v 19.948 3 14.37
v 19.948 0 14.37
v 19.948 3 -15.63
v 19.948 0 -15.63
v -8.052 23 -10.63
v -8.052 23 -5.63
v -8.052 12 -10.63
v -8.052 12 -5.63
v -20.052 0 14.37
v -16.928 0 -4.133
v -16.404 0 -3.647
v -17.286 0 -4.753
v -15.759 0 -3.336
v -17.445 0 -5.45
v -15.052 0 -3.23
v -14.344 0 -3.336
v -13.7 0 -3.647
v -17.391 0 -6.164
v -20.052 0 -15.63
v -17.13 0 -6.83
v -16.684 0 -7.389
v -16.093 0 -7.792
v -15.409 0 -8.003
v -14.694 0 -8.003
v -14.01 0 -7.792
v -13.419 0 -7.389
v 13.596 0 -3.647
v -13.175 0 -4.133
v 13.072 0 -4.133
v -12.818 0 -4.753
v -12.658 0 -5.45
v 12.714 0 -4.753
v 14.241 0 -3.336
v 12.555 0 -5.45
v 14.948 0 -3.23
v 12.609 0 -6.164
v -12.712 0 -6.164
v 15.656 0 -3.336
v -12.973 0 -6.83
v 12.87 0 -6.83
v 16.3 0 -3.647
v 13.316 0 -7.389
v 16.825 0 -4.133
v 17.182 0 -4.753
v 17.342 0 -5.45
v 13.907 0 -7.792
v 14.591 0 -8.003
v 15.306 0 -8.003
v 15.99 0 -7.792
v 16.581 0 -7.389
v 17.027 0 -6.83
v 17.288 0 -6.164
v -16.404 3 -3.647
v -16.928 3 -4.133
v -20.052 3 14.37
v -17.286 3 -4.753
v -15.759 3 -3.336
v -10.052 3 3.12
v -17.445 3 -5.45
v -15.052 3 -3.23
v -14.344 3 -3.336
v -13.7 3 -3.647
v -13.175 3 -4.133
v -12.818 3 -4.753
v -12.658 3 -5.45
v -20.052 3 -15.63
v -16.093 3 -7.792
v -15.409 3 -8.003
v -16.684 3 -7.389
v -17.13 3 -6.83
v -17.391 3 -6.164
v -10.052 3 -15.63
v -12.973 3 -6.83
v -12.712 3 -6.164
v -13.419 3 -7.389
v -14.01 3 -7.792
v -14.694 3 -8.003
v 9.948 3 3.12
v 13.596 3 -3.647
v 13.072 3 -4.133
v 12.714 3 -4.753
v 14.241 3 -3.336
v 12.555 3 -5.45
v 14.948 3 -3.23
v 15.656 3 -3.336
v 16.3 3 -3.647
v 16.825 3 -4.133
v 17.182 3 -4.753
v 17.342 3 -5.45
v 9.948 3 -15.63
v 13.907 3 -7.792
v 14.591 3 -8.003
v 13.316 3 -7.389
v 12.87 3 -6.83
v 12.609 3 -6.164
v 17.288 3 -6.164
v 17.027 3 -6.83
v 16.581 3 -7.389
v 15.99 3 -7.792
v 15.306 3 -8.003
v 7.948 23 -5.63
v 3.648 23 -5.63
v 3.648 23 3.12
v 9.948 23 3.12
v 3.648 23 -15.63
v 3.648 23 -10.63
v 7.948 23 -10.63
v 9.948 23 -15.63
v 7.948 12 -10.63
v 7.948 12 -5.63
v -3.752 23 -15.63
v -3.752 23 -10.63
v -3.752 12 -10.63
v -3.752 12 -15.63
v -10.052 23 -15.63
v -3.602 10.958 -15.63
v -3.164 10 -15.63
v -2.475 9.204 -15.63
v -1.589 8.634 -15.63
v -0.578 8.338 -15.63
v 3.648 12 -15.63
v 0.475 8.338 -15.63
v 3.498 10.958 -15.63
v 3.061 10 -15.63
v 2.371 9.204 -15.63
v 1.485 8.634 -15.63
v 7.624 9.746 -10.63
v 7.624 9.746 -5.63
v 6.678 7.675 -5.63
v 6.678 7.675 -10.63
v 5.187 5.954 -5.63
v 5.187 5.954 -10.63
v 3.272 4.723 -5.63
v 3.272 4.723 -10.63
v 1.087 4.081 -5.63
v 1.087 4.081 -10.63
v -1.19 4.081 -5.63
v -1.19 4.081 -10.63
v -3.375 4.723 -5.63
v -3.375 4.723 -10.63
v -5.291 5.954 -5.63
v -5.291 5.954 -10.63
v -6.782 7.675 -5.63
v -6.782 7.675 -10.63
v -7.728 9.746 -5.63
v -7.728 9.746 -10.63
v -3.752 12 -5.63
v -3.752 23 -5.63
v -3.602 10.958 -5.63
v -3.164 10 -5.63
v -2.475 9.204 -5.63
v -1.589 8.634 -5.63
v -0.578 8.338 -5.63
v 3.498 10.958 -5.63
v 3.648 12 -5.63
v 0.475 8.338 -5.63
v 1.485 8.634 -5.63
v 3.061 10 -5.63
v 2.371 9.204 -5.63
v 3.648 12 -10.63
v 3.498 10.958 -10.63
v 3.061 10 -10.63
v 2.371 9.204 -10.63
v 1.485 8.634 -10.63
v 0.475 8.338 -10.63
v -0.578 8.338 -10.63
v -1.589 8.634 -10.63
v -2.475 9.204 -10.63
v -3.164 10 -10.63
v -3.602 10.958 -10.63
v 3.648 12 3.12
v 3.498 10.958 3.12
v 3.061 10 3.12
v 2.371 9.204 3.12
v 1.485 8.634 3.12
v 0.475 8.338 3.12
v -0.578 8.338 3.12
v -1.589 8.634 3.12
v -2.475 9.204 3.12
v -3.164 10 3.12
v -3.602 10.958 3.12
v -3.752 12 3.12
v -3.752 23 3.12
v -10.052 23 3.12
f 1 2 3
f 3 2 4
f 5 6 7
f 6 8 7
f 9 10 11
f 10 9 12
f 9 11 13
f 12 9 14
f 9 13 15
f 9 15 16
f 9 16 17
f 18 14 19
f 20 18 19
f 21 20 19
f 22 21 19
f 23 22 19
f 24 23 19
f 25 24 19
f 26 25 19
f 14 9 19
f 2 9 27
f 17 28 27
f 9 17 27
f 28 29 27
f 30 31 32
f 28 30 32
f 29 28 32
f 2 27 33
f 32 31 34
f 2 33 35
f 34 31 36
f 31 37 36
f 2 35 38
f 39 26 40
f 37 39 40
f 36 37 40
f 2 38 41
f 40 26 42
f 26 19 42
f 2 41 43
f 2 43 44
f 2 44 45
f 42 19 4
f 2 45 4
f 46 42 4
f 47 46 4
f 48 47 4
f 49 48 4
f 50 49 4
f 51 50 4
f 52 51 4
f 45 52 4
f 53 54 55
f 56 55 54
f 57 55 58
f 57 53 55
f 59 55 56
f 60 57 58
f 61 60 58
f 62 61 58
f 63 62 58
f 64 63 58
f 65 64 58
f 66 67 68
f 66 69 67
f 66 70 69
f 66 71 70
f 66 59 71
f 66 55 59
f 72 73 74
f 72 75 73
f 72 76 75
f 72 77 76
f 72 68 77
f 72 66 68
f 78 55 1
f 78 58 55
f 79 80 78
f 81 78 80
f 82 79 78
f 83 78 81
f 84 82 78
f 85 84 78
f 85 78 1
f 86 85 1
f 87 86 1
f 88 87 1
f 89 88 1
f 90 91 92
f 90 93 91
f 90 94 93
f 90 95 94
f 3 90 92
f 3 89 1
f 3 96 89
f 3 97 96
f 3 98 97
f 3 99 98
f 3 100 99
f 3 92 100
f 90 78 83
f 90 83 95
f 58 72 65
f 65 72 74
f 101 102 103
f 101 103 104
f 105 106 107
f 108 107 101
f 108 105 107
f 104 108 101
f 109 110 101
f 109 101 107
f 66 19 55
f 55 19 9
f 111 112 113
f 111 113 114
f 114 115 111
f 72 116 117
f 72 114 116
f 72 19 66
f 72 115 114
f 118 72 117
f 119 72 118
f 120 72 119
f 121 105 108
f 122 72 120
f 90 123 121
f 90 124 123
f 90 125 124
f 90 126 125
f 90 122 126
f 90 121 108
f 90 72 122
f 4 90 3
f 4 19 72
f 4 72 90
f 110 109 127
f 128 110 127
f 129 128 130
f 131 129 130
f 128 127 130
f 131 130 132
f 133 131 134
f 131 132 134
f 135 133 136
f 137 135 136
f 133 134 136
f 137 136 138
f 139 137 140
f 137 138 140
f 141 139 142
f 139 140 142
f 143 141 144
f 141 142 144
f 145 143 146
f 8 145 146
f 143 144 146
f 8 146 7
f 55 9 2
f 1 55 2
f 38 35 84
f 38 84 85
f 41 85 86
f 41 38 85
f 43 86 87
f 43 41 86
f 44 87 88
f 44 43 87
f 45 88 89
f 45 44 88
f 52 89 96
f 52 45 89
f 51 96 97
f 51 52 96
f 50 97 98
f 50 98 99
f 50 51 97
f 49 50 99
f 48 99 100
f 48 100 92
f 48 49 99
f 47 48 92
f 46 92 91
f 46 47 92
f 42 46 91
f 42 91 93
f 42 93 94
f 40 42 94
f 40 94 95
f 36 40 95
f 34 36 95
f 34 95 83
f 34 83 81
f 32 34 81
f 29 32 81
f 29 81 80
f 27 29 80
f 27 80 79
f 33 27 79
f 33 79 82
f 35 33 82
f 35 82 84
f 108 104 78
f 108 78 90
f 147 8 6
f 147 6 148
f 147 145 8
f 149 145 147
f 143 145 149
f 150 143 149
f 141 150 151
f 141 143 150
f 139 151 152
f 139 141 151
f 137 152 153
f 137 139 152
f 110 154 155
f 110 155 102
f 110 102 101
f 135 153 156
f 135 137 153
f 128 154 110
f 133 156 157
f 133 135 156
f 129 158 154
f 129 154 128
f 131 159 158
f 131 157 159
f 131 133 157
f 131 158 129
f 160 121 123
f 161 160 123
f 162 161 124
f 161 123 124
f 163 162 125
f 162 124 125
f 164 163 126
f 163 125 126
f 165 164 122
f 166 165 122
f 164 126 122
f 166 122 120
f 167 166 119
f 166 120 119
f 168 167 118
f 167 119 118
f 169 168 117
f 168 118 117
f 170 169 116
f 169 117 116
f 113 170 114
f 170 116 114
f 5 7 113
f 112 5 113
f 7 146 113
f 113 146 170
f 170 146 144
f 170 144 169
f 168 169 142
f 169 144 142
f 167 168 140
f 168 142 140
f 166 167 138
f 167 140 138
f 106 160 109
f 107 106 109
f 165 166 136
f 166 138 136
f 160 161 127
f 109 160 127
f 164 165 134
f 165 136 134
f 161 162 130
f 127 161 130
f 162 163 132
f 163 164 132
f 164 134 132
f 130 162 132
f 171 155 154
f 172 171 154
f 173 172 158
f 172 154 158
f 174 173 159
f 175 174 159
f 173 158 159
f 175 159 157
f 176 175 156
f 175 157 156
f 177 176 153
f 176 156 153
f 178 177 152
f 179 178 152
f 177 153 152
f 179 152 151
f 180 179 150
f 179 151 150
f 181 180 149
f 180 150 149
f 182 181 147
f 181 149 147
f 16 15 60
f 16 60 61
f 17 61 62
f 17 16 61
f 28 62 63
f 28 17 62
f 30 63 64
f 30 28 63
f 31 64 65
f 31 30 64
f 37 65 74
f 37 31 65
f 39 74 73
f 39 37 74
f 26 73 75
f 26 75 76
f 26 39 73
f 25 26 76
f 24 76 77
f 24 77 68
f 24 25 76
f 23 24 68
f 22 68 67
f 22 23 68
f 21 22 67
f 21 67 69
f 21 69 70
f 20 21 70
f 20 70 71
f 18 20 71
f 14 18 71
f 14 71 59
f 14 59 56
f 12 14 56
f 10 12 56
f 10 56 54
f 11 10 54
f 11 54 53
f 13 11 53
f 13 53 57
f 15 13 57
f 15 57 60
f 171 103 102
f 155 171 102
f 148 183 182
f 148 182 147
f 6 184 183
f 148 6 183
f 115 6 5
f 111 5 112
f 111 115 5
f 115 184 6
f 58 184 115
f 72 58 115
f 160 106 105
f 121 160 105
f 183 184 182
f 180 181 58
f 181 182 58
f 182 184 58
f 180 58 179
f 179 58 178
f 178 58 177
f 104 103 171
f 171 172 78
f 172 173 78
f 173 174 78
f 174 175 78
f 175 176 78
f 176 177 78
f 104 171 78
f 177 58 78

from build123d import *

# Parameters (mm, degrees)
ESQUISSE3_W                  = 10
ESQUISSE3_H                  = 15
ESQUISSE3_H_2                = 10
ESQUISSE3_H_3                = 5
BOSS_EXTRU_1_DEPTH           = 3
ESQUISSE4_W                  = 10
ESQUISSE4_H                  = 5
ESQUISSE4_H_2                = 3.75
BOSS_EXTRU_2_DEPTH           = 17
ENL_V_MAT_EXTRU_1_DEPTH      = 5
ENL_V_MAT_EXTRU_2_DEPTH      = 18.75
ESQUISSE8_W                  = 20
ESQUISSE8_H                  = 18.75
ESQUISSE8_W_2                = 16
ESQUISSE8_H_2                = 5
BOSS_EXTRU_3_DEPTH           = 3
ESQUISSE9_R                  = 3.7
ESQUISSE9_R_2                = 3
ENL_V_MAT_EXTRU_3_DEPTH      = 43.790987898
ENL_V_START                  = -6
ESQUISSE10_R                 = 2.4
ESQUISSE10_R_2               = 2
ENL_V_MAT_EXTRU_4_DEPTH      = 6
ENL_V_MAT_EXTRU_5_REACH      = 36.283
ENL_V_MAT_EXTRU_5_END_RADIUS = 3.7
ESQUISSE12_W                 = 3.7
ESQUISSE12_H                 = 5
ESQUISSE12_W_2               = 7.4
ESQUISSE12_H_2               = 8.75


with BuildPart() as part:
    # Esquisse3 → Boss.-Extru.1 (new body)
    with BuildSketch(Plane(origin=(0, 0, 0), x_dir=(1, 0, 0), z_dir=(0, 1, 0))):
        with Locations((-15.05164944, -6.870348765)):
            Rectangle(ESQUISSE3_W, ESQUISSE3_H)
        with Locations((14.94835056, -6.870348765)):
            Rectangle(ESQUISSE3_W, ESQUISSE3_H)
        with BuildLine():
            Line((-10.05164944, 5.629651235), (-10.05164944, 15.629651235))
            Line((-10.05164944, 15.629651235), (-20.05164944, 15.629651235))
            Line((-20.05164944, 15.629651235), (-20.05164944, 5.629651235))
            Line((-20.05164944, 5.629651235), (-17.05164944, 5.629651235))
            ThreePointArc((-17.05164944, 5.629651235), (-15.05164944, 7.629651235), (-13.05164944, 5.629651235))
            Line((-13.05164944, 5.629651235), (-10.05164944, 5.629651235))
        make_face()
        with BuildLine():
            Line((-10.05164944, 0.629651235), (-10.05164944, 5.629651235))
            Line((-10.05164944, 5.629651235), (-13.05164944, 5.629651235))
            ThreePointArc((-13.05164944, 5.629651235), (-15.05164944, 3.629651235), (-17.05164944, 5.629651235))
            Line((-17.05164944, 5.629651235), (-20.05164944, 5.629651235))
            Line((-20.05164944, 5.629651235), (-20.05164944, 0.629651235))
            Line((-20.05164944, 0.629651235), (-10.05164944, 0.629651235))
        make_face()
        with Locations((-5.05164944, 10.629651235)):
            Rectangle(ESQUISSE3_W, ESQUISSE3_H_2)
        with Locations((4.94835056, 10.629651235)):
            Rectangle(ESQUISSE3_W, ESQUISSE3_H_2)
        with BuildLine():
            Line((19.94835056, 15.629651235), (9.94835056, 15.629651235))
            Line((9.94835056, 15.629651235), (9.94835056, 5.629651235))
            Line((9.94835056, 5.629651235), (12.94835056, 5.629651235))
            ThreePointArc((12.94835056, 5.629651235), (14.94835056, 7.629651235), (16.94835056, 5.629651235))
            Line((16.94835056, 5.629651235), (19.94835056, 5.629651235))
            Line((19.94835056, 5.629651235), (19.94835056, 15.629651235))
        make_face()
        with BuildLine():
            Line((12.94835056, 5.629651235), (9.94835056, 5.629651235))
            Line((9.94835056, 5.629651235), (9.94835056, 0.629651235))
            Line((9.94835056, 0.629651235), (19.94835056, 0.629651235))
            Line((19.94835056, 0.629651235), (19.94835056, 5.629651235))
            Line((19.94835056, 5.629651235), (16.94835056, 5.629651235))
            ThreePointArc((16.94835056, 5.629651235), (14.94835056, 3.629651235), (12.94835056, 5.629651235))
        make_face()
        with Locations((4.94835056, -6.870348765)):
            Rectangle(ESQUISSE3_W, ESQUISSE3_H)
        with Locations((-5.05164944, -6.870348765)):
            Rectangle(ESQUISSE3_W, ESQUISSE3_H)
        with Locations((4.94835056, 3.129651235)):
            Rectangle(ESQUISSE3_W, ESQUISSE3_H_3)
        with Locations((-5.05164944, 3.129651235)):
            Rectangle(ESQUISSE3_W, ESQUISSE3_H_3)
    extrude(amount=BOSS_EXTRU_1_DEPTH)

    # Esquisse4 → Boss.-Extru.2 (add)
    with BuildSketch(Plane(origin=(0, 3, 0), x_dir=(1, 0, 0), z_dir=(0, 1, 0))):
        with Locations((-5.05164944, 3.129651235)):
            Rectangle(ESQUISSE4_W, ESQUISSE4_H)
        with Locations((-5.05164944, -1.245348765)):
            Rectangle(ESQUISSE4_W, ESQUISSE4_H_2)
        with Locations((4.94835056, -1.245348765)):
            Rectangle(ESQUISSE4_W, ESQUISSE4_H_2)
        with Locations((4.94835056, 3.129651235)):
            Rectangle(ESQUISSE4_W, ESQUISSE4_H)
        Polygon((-0.05164944, 15.629651235), (-0.05164944, 5.629651235), (9.94835056, 5.629651235), (9.94835056, 8.129651235), align=None)
        Polygon((-10.05164944, 8.129651235), (-10.05164944, 5.629651235), (-0.05164944, 5.629651235), (-0.05164944, 15.629651235), align=None)
        Polygon((-10.05164944, 15.629651235), (-10.05164944, 8.129651235), (-0.05164944, 15.629651235), align=None)
        Polygon((9.94835056, 15.629651235), (-0.05164944, 15.629651235), (9.94835056, 8.129651235), align=None)
    extrude(amount=BOSS_EXTRU_2_DEPTH)

    # Esquisse6 → Enlèv. mat.-Extru.1 (cut)
    with BuildSketch(Plane(origin=(0, 0, -10.629651235), x_dir=(-1, 0, 0), z_dir=(0, 0, -1))):
        with BuildLine():
            Line((8.05164944, 20), (-7.94835056, 20))
            Line((-7.94835056, 20), (-7.94835056, 12))
            ThreePointArc((-7.94835056, 12), (0.05164944, 4), (8.05164944, 12))
            Line((8.05164944, 12), (8.05164944, 20))
        make_face()
    extrude(amount=-ENL_V_MAT_EXTRU_1_DEPTH, mode=Mode.SUBTRACT)

    # Esquisse7 → Enlèv. mat.-Extru.2 (cut)
    with BuildSketch(Plane(origin=(0, 0, -15.629651235), x_dir=(-1, 0, 0), z_dir=(0, 0, -1))):
        with BuildLine():
            ThreePointArc((3.05164944, 12), (2.823288037, 13.148050297), (2.172969783, 14.121320344))
            Line((2.172969783, 14.121320344), (0.05164944, 12))
            Line((0.05164944, 12), (2.172969783, 9.878679656))
            ThreePointArc((2.172969783, 9.878679656), (2.823288037, 10.851949703), (3.05164944, 12))
        make_face()
        with BuildLine():
            Line((0.05164944, 12), (2.172969783, 14.121320344))
            ThreePointArc((2.172969783, 14.121320344), (0.05164944, 15), (-2.069670904, 14.121320344))
            Line((-2.069670904, 14.121320344), (0.05164944, 12))
        make_face()
        with BuildLine():
            ThreePointArc((-2.069670904, 9.878679656), (0.05164944, 9), (2.172969783, 9.878679656))
            Line((2.172969783, 9.878679656), (0.05164944, 12))
            Line((0.05164944, 12), (-2.069670904, 9.878679656))
        make_face()
        with BuildLine():
            Line((0.05164944, 12), (-2.069670904, 14.121320344))
            ThreePointArc((-2.069670904, 14.121320344), (-2.94835056, 12), (-2.069670904, 9.878679656))
            Line((-2.069670904, 9.878679656), (0.05164944, 12))
        make_face()
    extrude(amount=-ENL_V_MAT_EXTRU_2_DEPTH, mode=Mode.SUBTRACT)

    # Esquisse8 → Boss.-Extru.3 (add)
    with BuildSketch(Plane(origin=(0, 20, 0), x_dir=(1, 0, 0), z_dir=(0, 1, 0))):
        with Locations((-0.05164944, 6.254651235)):
            Rectangle(ESQUISSE8_W, ESQUISSE8_H)
        with Locations((-0.05164944, 8.129651235)):
            Rectangle(ESQUISSE8_W_2, ESQUISSE8_H_2, mode=Mode.SUBTRACT)
    extrude(amount=BOSS_EXTRU_3_DEPTH)

    # Esquisse9 → Enlèv. mat.-Extru.3 (cut, through all)
    with BuildSketch(Plane(origin=(0, 0, -15.629651235), x_dir=(-1, 0, 0), z_dir=(0, 0, -1))):
        with Locations((0.05164944, 12)):
            Circle(ESQUISSE9_R)
        with Locations((0.05164944, 12)):
            Circle(ESQUISSE9_R_2, mode=Mode.SUBTRACT)
    extrude(amount=-ENL_V_MAT_EXTRU_3_DEPTH, mode=Mode.SUBTRACT)

    # Esquisse10 → Enlèv. mat.-Extru.4 (cut)
    # profile 1 of 2: a face of its own
    with BuildSketch(Plane(origin=(0, 3, 0), x_dir=(1, 0, 0), z_dir=(0, 1, 0)).offset(ENL_V_START)):
        with Locations(Location((-15.05164944, 5.629651235, 0), (0, 0, 270))):
            Circle(ESQUISSE10_R)
        with Locations((-15.05164944, 5.629651235)):
            Circle(ESQUISSE10_R_2, mode=Mode.SUBTRACT)
    # profile 2 of 2: a face of its own
    with BuildSketch(Plane(origin=(0, 3, 0), x_dir=(1, 0, 0), z_dir=(0, 1, 0)).offset(ENL_V_START)):
        with Locations(Location((14.94835056, 5.629651235, 0), (0, 0, 270))):
            Circle(ESQUISSE10_R)
        with Locations((14.94835056, 5.629651235)):
            Circle(ESQUISSE10_R_2, mode=Mode.SUBTRACT)
    extrude(amount=ENL_V_MAT_EXTRU_4_DEPTH, mode=Mode.SUBTRACT)

    # Enlèv. mat.-Extru.5: up to this cylinder (the profile starts outside it)
    enl_v_mat_extru_5_end = Plane(origin=(-0.05164944, 12, -7.192151), z_dir=(0, 0, -1)) * Cylinder(ENL_V_MAT_EXTRU_5_END_RADIUS, 92.841, mode=Mode.PRIVATE)
    # Esquisse12 → Enlèv. mat.-Extru.5 (cut, up to the surface)
    with BuildSketch(Plane(origin=(0, 23, 0), x_dir=(1, 0, 0), z_dir=(0, 1, 0)), mode=Mode.PRIVATE) as enl_v_mat_extru_5_sk1:
        with Locations((-1.90164944, 13.129651235)):
            Rectangle(ESQUISSE12_W, ESQUISSE12_H)
    enl_v_mat_extru_5_tool1 = extrude(enl_v_mat_extru_5_sk1.sketch, amount=-ENL_V_MAT_EXTRU_5_REACH, mode=Mode.PRIVATE) - enl_v_mat_extru_5_end
    add(enl_v_mat_extru_5_tool1.solids().sort_by_distance((-1.901649, 23, -13.129651))[0], mode=Mode.SUBTRACT)
    # Esquisse12 → Enlèv. mat.-Extru.5 (cut, up to the surface)
    with BuildSketch(Plane(origin=(0, 23, 0), x_dir=(1, 0, 0), z_dir=(0, 1, 0)), mode=Mode.PRIVATE) as enl_v_mat_extru_5_sk2:
        with Locations((1.79835056, 13.129651235)):
            Rectangle(ESQUISSE12_W, ESQUISSE12_H)
    enl_v_mat_extru_5_tool2 = extrude(enl_v_mat_extru_5_sk2.sketch, amount=-ENL_V_MAT_EXTRU_5_REACH, mode=Mode.PRIVATE) - enl_v_mat_extru_5_end
    add(enl_v_mat_extru_5_tool2.solids().sort_by_distance((1.798351, 23, -13.129651))[0], mode=Mode.SUBTRACT)
    # Esquisse12 → Enlèv. mat.-Extru.5 (cut, up to the surface)
    with BuildSketch(Plane(origin=(0, 23, 0), x_dir=(1, 0, 0), z_dir=(0, 1, 0)), mode=Mode.PRIVATE) as enl_v_mat_extru_5_sk3:
        with Locations((-0.05164944, 1.254651235)):
            Rectangle(ESQUISSE12_W_2, ESQUISSE12_H_2)
    enl_v_mat_extru_5_tool3 = extrude(enl_v_mat_extru_5_sk3.sketch, amount=-ENL_V_MAT_EXTRU_5_REACH, mode=Mode.PRIVATE) - enl_v_mat_extru_5_end
    add(enl_v_mat_extru_5_tool3.solids().sort_by_distance((-0.051649, 23, -1.254651))[0], mode=Mode.SUBTRACT)


solid = part.part
